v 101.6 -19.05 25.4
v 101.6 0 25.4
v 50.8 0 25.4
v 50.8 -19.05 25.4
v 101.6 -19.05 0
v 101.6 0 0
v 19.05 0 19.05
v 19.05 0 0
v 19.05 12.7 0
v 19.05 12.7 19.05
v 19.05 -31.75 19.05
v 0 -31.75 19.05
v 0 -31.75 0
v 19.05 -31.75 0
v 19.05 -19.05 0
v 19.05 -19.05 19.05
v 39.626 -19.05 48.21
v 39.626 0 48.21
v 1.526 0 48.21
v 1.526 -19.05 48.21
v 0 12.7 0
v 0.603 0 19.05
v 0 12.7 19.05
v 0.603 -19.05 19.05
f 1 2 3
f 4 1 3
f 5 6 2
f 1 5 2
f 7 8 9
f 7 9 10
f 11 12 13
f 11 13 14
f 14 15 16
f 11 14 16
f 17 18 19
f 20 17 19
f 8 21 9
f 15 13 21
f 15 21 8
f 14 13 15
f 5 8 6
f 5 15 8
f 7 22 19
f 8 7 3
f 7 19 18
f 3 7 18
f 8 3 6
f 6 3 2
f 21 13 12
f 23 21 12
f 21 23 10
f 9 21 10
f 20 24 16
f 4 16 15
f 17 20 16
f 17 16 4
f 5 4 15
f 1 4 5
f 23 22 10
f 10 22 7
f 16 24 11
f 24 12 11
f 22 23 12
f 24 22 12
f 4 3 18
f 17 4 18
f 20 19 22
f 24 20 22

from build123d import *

# Parameters (mm, degrees)
F1_DEPTH      = 19.05
F2_W          = 19.05
F2_H          = 19.05
F3_DEPTH      = 31.75
F3_DEPTH_BACK = 12.7


with BuildPart() as f1:
    # F0 (on Front) → F1 (new body)
    with BuildSketch(Plane.XZ):
        Polygon((1.5262, 48.210221), (0, 0), (101.6, 0), (101.6, 25.4), (53.855859, 25.4), (50.8, 25.4), (39.6262, 48.210221), align=None)
    extrude(amount=F1_DEPTH)

    # F2 (on Front) → F3 (join, two sides)
    with BuildSketch(Plane.XZ) as f3_sk:
        with Locations((9.525, 9.525)):
            Rectangle(F2_W, F2_H)
    extrude(amount=F3_DEPTH)
    extrude(f3_sk.sketch, amount=-F3_DEPTH_BACK)


solid = f1.part
